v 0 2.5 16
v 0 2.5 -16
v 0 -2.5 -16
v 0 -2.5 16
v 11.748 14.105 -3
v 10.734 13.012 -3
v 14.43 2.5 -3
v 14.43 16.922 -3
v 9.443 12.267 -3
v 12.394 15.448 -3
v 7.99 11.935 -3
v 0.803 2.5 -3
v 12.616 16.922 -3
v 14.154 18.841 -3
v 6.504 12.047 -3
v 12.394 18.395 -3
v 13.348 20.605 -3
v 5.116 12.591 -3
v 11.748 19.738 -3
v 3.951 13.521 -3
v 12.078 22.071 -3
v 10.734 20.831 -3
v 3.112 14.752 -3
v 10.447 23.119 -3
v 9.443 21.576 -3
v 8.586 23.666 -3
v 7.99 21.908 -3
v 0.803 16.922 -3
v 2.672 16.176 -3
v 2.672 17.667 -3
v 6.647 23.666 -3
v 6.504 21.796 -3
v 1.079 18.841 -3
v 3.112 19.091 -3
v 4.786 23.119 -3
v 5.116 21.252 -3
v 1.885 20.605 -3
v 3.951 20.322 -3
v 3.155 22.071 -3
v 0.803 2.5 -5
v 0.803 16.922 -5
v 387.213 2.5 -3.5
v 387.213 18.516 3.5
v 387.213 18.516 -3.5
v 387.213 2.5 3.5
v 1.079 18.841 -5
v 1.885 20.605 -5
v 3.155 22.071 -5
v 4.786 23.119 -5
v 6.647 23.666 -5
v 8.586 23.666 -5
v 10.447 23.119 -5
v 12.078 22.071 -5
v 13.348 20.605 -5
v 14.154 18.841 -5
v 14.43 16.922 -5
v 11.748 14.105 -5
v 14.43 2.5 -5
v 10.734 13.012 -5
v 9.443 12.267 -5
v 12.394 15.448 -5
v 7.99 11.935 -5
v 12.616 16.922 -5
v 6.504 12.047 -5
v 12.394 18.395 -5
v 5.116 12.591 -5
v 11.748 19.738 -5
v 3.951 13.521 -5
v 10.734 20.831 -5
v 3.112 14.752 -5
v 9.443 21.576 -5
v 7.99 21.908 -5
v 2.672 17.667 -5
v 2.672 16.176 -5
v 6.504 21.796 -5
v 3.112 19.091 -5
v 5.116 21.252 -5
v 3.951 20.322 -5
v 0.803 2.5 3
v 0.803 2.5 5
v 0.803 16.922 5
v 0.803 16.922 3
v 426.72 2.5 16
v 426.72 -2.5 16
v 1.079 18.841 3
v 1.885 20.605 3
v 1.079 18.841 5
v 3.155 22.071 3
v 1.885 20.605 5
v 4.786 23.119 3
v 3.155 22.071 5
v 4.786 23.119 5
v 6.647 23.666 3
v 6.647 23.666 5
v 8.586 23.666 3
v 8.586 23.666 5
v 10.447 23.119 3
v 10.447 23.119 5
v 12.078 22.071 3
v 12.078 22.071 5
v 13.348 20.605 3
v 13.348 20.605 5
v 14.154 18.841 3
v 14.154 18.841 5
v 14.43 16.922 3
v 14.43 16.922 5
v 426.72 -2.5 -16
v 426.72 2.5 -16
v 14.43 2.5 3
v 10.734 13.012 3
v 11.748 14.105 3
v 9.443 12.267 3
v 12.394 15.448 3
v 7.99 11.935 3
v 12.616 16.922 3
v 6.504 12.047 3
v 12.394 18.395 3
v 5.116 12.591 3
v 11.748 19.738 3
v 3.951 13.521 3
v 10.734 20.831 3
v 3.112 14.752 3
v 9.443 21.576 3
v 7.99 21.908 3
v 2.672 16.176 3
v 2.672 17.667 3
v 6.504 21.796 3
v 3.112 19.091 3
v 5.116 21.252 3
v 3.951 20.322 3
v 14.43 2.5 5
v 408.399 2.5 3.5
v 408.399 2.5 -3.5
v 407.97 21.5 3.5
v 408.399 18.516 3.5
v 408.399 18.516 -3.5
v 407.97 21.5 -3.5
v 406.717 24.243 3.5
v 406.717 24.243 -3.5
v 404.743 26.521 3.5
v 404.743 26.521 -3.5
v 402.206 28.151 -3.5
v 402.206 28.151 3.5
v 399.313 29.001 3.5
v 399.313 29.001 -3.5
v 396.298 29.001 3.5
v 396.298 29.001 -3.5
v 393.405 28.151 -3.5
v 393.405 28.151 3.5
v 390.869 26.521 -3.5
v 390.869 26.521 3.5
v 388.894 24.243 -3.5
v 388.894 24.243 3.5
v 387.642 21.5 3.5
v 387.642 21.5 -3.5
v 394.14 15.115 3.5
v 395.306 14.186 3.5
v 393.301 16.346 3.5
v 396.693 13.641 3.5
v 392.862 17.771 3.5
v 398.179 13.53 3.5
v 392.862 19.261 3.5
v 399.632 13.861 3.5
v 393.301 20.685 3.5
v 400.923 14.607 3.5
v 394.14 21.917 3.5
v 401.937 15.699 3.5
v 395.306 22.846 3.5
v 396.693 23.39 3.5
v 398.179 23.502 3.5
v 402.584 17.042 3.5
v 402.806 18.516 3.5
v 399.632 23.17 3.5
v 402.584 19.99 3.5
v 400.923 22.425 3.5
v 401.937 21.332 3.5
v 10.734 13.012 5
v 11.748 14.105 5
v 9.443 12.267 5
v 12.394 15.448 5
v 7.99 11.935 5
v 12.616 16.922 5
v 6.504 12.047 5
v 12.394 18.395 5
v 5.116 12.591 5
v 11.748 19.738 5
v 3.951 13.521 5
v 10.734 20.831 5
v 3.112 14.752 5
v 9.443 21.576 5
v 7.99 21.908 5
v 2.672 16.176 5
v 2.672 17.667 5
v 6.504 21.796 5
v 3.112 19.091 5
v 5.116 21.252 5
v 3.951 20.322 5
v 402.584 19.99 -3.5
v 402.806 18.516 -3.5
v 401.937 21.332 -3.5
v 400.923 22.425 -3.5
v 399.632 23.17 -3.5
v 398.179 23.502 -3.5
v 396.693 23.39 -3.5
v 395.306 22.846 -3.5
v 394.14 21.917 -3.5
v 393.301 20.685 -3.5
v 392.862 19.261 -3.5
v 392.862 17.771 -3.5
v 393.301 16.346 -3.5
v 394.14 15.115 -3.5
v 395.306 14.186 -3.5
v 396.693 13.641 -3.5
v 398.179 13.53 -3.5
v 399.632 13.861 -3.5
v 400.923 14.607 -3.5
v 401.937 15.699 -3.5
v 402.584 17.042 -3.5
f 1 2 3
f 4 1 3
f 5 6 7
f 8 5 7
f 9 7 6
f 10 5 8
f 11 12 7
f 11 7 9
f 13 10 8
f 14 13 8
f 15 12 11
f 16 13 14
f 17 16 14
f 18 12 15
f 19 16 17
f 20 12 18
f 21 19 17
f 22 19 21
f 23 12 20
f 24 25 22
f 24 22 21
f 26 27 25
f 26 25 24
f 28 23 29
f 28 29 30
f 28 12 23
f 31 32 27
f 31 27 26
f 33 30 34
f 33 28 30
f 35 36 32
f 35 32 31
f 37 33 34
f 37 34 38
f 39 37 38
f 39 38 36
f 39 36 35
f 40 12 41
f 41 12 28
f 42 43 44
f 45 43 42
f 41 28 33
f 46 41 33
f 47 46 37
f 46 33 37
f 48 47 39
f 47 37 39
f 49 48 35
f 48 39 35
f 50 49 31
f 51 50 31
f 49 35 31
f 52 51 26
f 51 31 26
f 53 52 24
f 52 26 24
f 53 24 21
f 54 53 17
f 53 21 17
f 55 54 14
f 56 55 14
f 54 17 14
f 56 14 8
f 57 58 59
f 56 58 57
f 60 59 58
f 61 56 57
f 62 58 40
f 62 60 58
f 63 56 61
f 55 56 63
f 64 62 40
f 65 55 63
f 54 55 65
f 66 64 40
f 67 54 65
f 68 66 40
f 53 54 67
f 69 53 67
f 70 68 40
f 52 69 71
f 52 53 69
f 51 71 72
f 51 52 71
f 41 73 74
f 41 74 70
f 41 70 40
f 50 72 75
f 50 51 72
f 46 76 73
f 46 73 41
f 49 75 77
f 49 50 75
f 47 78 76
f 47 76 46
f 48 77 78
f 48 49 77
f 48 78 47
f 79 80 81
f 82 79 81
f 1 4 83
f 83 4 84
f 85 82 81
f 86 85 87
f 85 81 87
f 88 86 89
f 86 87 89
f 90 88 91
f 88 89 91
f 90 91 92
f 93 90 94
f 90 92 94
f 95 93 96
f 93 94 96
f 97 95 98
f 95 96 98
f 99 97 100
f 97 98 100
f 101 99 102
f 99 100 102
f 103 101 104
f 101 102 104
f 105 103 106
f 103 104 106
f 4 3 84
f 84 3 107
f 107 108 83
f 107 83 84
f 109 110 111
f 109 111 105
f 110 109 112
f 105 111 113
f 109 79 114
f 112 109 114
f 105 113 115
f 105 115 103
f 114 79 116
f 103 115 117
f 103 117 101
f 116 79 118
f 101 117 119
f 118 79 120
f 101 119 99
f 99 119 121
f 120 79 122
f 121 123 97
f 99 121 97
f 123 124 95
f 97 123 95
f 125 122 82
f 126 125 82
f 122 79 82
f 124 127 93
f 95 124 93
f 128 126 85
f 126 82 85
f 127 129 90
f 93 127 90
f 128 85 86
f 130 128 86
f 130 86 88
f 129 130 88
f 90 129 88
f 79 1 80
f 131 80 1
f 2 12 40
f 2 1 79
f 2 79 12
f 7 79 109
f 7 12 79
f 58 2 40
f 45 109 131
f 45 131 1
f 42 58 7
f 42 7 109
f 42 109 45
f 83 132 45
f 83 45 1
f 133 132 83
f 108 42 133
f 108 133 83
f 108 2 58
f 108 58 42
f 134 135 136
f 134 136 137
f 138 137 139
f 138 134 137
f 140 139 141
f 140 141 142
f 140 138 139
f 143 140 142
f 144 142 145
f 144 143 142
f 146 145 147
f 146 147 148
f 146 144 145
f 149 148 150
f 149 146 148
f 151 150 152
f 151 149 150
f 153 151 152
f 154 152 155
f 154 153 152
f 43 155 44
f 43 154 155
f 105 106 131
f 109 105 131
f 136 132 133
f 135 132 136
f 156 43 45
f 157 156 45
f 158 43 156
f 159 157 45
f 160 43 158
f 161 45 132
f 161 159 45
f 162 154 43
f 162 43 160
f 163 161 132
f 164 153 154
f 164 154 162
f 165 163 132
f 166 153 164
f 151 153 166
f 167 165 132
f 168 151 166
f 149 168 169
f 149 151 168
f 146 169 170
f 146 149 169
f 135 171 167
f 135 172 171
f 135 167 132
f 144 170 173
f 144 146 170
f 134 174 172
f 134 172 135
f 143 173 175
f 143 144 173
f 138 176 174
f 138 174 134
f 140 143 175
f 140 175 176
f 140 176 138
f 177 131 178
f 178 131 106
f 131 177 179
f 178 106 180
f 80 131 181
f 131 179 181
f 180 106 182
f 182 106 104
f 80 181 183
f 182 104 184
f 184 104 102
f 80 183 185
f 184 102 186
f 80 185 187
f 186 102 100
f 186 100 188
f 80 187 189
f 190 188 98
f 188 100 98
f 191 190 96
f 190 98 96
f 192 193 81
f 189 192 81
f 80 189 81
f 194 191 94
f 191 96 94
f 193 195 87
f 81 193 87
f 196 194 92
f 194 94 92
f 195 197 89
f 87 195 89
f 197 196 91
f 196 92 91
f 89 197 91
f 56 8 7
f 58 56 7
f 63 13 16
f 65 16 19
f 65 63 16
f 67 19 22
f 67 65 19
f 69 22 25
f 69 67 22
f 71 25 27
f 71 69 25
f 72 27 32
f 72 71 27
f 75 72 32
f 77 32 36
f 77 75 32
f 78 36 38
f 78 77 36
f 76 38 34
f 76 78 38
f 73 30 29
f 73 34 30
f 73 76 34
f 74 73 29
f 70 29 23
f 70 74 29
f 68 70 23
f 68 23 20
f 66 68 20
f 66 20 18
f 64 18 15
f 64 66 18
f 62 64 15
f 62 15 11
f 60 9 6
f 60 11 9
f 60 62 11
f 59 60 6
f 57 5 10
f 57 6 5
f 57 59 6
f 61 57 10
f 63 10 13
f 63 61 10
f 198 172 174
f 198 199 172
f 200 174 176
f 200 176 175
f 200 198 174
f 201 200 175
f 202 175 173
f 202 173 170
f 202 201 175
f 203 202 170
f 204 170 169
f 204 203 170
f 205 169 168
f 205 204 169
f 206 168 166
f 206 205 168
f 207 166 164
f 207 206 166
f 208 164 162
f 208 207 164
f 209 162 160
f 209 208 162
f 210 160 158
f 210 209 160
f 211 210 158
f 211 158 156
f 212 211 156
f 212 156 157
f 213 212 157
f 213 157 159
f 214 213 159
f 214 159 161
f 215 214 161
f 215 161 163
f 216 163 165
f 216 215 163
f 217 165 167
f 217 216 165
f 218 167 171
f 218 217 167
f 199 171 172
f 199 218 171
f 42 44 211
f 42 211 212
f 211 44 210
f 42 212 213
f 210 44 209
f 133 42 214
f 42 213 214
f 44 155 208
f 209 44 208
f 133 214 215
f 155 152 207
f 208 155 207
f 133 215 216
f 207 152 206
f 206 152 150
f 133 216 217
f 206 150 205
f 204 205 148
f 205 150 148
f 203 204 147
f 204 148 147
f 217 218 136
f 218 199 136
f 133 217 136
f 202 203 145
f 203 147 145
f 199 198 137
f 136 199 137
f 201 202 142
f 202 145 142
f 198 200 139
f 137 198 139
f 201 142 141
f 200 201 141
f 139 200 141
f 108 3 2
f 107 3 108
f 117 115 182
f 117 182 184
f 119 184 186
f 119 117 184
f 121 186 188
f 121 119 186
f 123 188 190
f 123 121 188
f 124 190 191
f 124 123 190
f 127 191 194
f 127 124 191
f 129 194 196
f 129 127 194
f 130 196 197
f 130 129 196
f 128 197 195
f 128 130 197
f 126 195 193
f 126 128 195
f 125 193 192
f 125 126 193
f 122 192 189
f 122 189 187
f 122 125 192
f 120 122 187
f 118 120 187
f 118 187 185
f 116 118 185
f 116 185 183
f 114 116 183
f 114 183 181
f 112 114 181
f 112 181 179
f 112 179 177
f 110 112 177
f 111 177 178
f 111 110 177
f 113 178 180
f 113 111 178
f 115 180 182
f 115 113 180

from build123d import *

# Parameters (mm, degrees)
SKETCH1_W          = 426.72
SKETCH1_H          = 5
EXTRUDE2_DEPTH     = 16
SKETCH2_R          = 5
EXTRUDE3_DEPTH     = 5
SKETCH3_W          = 6
SKETCH3_H          = 40.995425817
CUT_EXTRUDE1_DEPTH = 13.626819
SKETCH4_R          = 5
EXTRUDE4_DEPTH     = 3.5


with BuildPart() as part:
    # Sketch1 → Extrude2 (new body, symmetric)
    with BuildSketch(Plane(origin=(0, 0, 0), x_dir=(1, 0, 0), z_dir=(0, 0, -1))):
        with Locations((213.36, 0)):
            Rectangle(SKETCH1_W, SKETCH1_H)
    extrude(amount=EXTRUDE2_DEPTH, both=True)

    # Sketch2 → Extrude3 (add, symmetric)
    with BuildSketch(Plane.XY):
        with BuildLine():
            Line((0.803073324, 2.5), (0.803073324, 16.921503506))
            ThreePointArc((0.803073324, 16.921503506), (7.616482736, 23.734912918), (14.429892147, 16.921503506))
            Line((14.429892147, 16.921503506), (14.429892147, 2.5))
            Line((14.429892147, 2.5), (0.803073324, 2.5))
        make_face()
        with Locations((7.616482736, 16.921503506)):
            Circle(SKETCH2_R, mode=Mode.SUBTRACT)
    extrude(amount=EXTRUDE3_DEPTH, both=True)

    # Sketch3 → Cut-Extrude1 (cut)
    with BuildSketch(Plane.ZY.offset(-0.803073324)):
        with Locations((0, 22.997712909)):
            Rectangle(SKETCH3_W, SKETCH3_H)
    extrude(amount=-CUT_EXTRUDE1_DEPTH, mode=Mode.SUBTRACT)

    # Sketch4 → Extrude4 (add, symmetric)
    with BuildSketch(Plane.XY):
        with BuildLine():
            Line((408.398633308, 2.5), (408.398633308, 18.51574669))
            ThreePointArc((408.398633308, 18.51574669), (397.805657025, 29.108722972), (387.212680742, 18.51574669))
            Line((387.212680742, 18.51574669), (387.212680742, 2.5))
            Line((387.212680742, 2.5), (408.398633308, 2.5))
        make_face()
        with Locations((397.805657025, 18.51574669)):
            Circle(SKETCH4_R, mode=Mode.SUBTRACT)
    extrude(amount=EXTRUDE4_DEPTH, both=True)


solid = part.part
